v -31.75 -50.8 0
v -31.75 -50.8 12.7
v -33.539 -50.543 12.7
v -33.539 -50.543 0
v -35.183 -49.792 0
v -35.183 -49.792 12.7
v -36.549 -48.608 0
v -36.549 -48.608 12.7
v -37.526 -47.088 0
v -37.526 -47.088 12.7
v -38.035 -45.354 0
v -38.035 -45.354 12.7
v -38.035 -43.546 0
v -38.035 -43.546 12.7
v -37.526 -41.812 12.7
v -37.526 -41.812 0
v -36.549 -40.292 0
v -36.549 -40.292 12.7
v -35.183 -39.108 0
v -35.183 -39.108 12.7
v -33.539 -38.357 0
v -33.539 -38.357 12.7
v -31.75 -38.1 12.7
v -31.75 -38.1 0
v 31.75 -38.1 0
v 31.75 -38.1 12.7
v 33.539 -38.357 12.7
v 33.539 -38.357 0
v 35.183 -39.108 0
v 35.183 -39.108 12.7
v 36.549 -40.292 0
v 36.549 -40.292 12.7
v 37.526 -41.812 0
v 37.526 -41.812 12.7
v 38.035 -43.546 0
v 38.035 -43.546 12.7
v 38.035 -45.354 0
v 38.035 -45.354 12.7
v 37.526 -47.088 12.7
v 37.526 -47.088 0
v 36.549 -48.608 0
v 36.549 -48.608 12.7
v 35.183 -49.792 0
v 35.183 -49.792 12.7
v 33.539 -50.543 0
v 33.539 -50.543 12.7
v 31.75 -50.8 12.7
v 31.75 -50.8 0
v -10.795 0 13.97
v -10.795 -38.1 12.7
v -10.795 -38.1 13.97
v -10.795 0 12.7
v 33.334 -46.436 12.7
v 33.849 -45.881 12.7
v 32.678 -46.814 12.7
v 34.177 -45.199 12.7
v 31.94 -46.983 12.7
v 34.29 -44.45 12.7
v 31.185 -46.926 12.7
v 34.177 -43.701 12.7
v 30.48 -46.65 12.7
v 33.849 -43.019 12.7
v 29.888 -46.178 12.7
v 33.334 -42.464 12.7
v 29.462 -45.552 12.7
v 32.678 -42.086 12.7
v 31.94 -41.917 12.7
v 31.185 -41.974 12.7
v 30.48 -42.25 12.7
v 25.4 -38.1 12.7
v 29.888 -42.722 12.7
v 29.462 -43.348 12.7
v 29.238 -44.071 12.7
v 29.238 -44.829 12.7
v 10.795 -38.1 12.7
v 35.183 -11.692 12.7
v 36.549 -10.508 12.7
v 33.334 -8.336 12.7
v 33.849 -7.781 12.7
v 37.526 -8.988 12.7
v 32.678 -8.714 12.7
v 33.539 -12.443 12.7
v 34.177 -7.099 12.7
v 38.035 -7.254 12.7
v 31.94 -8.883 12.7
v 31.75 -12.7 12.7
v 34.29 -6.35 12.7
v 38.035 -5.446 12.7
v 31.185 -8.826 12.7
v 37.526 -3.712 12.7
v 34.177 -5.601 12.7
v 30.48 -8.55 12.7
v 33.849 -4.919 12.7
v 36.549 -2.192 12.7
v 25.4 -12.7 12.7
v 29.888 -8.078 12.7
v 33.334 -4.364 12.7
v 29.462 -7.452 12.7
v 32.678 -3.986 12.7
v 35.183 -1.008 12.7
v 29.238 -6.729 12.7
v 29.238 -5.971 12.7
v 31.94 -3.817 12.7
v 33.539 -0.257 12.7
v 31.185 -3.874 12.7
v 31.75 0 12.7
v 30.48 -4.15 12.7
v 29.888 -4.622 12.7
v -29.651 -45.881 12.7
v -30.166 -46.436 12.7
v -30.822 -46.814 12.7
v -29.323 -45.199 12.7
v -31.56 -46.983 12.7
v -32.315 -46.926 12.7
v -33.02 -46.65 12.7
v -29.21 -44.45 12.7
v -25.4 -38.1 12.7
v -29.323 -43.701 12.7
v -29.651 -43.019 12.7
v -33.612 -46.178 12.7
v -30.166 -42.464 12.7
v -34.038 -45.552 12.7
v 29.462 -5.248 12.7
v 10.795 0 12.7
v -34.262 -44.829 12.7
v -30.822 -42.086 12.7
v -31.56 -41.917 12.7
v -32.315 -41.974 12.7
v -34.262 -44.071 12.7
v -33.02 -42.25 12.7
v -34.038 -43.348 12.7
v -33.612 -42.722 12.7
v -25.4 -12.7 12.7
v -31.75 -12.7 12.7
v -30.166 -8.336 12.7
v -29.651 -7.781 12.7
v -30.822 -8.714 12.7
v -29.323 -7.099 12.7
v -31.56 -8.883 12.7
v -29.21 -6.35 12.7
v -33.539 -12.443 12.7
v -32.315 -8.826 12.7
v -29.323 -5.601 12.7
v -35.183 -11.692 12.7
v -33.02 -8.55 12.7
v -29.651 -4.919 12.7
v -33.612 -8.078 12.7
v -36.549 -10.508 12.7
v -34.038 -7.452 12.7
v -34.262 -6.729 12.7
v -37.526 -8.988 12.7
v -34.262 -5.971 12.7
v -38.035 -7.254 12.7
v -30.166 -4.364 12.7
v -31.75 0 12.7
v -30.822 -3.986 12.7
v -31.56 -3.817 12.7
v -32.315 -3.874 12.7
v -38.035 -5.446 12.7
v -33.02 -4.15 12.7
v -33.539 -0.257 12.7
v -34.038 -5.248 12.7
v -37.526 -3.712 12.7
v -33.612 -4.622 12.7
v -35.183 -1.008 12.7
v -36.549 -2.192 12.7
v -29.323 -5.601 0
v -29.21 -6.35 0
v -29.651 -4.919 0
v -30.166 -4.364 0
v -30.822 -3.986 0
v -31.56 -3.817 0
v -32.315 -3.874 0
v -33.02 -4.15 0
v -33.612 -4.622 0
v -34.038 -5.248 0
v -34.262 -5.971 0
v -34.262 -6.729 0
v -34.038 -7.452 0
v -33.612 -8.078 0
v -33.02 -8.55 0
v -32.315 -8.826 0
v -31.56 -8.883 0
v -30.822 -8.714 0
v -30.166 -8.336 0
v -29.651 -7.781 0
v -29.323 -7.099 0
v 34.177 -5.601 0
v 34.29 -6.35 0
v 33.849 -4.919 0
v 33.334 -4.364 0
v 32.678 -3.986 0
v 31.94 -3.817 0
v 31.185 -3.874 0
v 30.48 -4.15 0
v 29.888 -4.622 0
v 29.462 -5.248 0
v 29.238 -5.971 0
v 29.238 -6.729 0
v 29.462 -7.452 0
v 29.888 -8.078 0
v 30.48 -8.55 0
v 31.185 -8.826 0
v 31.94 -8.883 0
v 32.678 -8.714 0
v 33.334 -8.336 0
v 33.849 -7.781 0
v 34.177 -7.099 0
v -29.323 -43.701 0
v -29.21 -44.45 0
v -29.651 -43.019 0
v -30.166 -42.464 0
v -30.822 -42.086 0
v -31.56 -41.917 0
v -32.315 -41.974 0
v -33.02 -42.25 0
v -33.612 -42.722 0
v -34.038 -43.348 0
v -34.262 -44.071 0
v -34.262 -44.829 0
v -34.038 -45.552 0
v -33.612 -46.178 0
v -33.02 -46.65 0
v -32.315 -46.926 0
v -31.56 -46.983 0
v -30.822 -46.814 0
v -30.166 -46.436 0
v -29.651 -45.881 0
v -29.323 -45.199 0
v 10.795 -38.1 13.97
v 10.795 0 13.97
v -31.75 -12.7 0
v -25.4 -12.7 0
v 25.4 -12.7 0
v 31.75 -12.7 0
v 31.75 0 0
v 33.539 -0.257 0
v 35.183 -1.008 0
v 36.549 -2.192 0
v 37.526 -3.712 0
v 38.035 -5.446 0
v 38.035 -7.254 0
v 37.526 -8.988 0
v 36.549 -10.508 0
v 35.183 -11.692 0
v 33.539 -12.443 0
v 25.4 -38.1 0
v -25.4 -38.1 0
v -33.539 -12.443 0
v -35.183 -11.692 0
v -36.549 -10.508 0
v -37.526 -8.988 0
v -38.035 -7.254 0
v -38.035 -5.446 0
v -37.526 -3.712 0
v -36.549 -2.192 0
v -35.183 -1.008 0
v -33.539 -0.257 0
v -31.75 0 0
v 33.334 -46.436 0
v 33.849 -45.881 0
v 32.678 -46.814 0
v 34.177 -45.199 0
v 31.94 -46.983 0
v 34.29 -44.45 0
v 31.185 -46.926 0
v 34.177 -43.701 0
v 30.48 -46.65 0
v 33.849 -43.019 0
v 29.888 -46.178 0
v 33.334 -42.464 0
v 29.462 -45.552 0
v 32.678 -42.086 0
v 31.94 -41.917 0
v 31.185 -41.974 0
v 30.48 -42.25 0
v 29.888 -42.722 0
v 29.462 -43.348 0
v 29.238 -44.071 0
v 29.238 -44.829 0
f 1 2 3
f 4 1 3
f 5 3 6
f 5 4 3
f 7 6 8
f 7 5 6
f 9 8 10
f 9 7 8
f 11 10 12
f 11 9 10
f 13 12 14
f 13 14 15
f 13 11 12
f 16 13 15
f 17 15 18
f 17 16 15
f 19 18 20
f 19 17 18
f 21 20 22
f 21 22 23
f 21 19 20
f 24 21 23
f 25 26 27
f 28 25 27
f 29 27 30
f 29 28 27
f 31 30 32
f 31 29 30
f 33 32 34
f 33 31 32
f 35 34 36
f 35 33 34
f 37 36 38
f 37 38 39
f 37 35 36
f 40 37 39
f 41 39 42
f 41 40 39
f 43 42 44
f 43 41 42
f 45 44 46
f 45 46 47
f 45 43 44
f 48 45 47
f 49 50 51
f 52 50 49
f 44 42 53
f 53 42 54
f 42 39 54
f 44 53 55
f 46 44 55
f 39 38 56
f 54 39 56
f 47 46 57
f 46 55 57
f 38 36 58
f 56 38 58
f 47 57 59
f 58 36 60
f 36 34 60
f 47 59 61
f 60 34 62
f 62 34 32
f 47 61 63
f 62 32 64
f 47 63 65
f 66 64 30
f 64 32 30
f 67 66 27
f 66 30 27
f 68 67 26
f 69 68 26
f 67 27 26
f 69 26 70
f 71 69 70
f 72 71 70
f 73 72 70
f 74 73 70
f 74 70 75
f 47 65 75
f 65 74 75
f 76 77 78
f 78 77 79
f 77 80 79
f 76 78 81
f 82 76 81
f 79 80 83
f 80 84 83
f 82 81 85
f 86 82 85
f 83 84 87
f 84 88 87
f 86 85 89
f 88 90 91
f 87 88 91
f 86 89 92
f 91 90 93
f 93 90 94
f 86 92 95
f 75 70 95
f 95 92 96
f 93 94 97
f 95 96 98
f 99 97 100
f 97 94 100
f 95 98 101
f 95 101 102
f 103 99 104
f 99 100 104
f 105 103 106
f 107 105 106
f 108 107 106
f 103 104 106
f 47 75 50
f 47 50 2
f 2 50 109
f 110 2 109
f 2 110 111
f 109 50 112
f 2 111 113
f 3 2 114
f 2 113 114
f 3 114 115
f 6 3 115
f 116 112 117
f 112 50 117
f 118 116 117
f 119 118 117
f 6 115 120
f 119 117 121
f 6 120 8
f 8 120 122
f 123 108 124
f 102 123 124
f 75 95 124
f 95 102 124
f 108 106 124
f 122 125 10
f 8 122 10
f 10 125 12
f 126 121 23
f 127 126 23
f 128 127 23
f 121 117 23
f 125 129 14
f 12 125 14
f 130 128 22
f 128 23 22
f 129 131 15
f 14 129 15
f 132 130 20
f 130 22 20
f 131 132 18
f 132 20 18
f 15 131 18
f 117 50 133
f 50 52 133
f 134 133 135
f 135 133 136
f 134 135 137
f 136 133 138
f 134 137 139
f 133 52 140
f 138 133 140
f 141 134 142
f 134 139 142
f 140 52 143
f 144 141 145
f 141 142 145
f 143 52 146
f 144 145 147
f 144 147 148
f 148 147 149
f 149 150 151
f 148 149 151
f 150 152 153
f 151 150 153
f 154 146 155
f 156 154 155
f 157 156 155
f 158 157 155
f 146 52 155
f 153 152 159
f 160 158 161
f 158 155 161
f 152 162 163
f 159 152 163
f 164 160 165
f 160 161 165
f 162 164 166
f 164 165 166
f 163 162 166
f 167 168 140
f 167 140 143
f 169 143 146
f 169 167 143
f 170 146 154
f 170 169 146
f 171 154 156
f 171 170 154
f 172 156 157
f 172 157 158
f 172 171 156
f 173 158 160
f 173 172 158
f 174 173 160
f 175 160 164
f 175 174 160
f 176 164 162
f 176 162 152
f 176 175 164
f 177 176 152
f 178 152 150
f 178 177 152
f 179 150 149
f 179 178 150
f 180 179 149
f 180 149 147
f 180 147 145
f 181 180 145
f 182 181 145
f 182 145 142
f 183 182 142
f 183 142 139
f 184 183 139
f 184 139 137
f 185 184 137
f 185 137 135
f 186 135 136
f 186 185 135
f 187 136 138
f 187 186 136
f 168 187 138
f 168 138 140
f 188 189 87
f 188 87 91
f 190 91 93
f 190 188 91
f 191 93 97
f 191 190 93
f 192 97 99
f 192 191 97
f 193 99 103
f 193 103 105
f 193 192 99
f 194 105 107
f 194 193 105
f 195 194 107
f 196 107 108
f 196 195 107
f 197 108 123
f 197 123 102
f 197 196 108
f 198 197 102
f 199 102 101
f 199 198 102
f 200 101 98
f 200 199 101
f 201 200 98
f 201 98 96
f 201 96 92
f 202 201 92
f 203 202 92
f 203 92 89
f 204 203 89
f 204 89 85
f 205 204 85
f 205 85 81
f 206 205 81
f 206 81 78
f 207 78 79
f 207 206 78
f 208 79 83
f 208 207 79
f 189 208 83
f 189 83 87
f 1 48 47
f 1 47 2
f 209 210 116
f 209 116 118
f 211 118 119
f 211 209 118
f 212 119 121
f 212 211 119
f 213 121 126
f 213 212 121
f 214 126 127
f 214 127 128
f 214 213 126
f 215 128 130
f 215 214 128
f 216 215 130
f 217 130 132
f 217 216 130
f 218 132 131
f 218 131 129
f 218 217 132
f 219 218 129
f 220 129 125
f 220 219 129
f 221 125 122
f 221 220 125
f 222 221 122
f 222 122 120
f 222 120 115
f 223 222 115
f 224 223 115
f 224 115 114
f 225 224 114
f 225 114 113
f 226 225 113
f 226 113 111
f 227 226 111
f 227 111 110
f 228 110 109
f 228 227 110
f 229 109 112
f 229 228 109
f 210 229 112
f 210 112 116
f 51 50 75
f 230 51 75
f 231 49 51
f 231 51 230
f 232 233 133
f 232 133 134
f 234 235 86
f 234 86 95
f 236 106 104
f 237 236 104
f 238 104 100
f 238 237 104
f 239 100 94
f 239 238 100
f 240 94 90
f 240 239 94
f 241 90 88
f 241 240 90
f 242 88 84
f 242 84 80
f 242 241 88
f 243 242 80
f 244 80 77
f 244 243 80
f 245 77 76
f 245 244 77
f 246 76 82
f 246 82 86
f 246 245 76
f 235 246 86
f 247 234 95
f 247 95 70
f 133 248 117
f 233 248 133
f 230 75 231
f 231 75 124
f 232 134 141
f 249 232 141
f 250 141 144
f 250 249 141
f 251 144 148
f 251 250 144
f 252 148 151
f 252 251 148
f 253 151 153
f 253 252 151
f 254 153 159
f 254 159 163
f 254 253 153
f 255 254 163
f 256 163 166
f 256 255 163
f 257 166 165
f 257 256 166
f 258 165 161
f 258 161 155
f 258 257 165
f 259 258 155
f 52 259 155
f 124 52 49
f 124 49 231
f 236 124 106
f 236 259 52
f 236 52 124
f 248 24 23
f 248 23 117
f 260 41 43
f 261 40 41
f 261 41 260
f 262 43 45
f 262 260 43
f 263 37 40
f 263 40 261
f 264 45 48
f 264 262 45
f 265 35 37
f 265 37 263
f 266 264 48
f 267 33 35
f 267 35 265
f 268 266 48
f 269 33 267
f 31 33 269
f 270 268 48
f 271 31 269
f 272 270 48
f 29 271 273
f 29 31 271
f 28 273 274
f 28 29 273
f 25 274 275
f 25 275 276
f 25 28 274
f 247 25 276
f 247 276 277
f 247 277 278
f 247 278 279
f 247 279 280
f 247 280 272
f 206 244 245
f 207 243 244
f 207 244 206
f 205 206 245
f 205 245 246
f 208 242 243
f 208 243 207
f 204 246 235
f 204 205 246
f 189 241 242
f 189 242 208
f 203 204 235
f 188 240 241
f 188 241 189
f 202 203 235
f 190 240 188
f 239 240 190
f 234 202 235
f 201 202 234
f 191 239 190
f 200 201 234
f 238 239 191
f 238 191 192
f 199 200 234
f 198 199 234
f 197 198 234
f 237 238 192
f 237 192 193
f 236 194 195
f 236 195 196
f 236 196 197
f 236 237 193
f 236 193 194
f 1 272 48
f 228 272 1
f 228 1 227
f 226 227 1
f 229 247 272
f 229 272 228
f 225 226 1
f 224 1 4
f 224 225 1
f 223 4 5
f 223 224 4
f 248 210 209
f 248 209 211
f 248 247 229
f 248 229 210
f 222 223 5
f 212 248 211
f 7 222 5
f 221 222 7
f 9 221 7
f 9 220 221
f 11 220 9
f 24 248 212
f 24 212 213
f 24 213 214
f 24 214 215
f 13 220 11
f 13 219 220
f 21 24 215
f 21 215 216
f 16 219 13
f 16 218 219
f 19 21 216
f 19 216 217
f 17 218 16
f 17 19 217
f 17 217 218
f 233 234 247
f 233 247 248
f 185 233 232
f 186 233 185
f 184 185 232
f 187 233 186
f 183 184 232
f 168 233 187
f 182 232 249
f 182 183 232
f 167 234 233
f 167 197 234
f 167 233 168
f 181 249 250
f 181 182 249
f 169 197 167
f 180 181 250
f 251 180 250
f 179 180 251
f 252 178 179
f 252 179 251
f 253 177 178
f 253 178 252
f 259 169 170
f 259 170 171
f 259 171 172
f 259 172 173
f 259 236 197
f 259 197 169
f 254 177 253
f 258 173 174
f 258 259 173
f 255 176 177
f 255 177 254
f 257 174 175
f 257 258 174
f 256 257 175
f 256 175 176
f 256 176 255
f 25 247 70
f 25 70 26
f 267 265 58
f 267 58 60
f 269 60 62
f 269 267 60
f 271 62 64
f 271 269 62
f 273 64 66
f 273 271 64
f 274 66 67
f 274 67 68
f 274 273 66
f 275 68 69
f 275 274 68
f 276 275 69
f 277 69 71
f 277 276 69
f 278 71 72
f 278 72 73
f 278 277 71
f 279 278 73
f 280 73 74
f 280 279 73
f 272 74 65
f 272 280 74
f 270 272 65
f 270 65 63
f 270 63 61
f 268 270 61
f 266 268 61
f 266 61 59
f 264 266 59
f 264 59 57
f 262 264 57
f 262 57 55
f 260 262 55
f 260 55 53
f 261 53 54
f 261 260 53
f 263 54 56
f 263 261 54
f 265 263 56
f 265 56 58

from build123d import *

# Parameters (mm, degrees)
SKETCH1_R           = 2.54
BOSS_EXTRUDE1_DEPTH = 12.7
SKETCH2_W           = 21.59
SKETCH2_H           = 38.1
BOSS_EXTRUDE2_DEPTH = 1.27


with BuildPart() as part:
    # Sketch1 → Boss-Extrude1 (new body)
    with BuildSketch(Plane.XY):
        with BuildLine():
            Line((-31.75, 0), (31.75, 0))
            ThreePointArc((31.75, 0), (38.1, -6.35), (31.75, -12.7))
            Line((31.75, -12.7), (25.4, -12.7))
            Line((25.4, -12.7), (25.4, -38.1))
            Line((25.4, -38.1), (31.75, -38.1))
            ThreePointArc((31.75, -38.1), (38.1, -44.45), (31.75, -50.8))
            Line((31.75, -50.8), (0, -50.8))
            Line((0, -50.8), (-31.75, -50.8))
            ThreePointArc((-31.75, -50.8), (-38.1, -44.45), (-31.75, -38.1))
            Line((-31.75, -38.1), (-25.4, -38.1))
            Line((-25.4, -38.1), (-25.4, -12.7))
            Line((-25.4, -12.7), (-31.75, -12.7))
            ThreePointArc((-31.75, -12.7), (-38.1, -6.35), (-31.75, 0))
        make_face()
        with Locations((-31.75, -6.35)):
            Circle(SKETCH1_R, mode=Mode.SUBTRACT)
        with Locations((31.75, -6.35)):
            Circle(SKETCH1_R, mode=Mode.SUBTRACT)
        with Locations((-31.75, -44.45)):
            Circle(SKETCH1_R, mode=Mode.SUBTRACT)
        with Locations((31.75, -44.45)):
            Circle(SKETCH1_R, mode=Mode.SUBTRACT)
    extrude(amount=BOSS_EXTRUDE1_DEPTH)

    # Sketch2 → Boss-Extrude2 (add)
    with BuildSketch(Plane.XY.offset(12.7)):
        with Locations((0, -19.05)):
            Rectangle(SKETCH2_W, SKETCH2_H)
    extrude(amount=BOSS_EXTRUDE2_DEPTH)


solid = part.part
